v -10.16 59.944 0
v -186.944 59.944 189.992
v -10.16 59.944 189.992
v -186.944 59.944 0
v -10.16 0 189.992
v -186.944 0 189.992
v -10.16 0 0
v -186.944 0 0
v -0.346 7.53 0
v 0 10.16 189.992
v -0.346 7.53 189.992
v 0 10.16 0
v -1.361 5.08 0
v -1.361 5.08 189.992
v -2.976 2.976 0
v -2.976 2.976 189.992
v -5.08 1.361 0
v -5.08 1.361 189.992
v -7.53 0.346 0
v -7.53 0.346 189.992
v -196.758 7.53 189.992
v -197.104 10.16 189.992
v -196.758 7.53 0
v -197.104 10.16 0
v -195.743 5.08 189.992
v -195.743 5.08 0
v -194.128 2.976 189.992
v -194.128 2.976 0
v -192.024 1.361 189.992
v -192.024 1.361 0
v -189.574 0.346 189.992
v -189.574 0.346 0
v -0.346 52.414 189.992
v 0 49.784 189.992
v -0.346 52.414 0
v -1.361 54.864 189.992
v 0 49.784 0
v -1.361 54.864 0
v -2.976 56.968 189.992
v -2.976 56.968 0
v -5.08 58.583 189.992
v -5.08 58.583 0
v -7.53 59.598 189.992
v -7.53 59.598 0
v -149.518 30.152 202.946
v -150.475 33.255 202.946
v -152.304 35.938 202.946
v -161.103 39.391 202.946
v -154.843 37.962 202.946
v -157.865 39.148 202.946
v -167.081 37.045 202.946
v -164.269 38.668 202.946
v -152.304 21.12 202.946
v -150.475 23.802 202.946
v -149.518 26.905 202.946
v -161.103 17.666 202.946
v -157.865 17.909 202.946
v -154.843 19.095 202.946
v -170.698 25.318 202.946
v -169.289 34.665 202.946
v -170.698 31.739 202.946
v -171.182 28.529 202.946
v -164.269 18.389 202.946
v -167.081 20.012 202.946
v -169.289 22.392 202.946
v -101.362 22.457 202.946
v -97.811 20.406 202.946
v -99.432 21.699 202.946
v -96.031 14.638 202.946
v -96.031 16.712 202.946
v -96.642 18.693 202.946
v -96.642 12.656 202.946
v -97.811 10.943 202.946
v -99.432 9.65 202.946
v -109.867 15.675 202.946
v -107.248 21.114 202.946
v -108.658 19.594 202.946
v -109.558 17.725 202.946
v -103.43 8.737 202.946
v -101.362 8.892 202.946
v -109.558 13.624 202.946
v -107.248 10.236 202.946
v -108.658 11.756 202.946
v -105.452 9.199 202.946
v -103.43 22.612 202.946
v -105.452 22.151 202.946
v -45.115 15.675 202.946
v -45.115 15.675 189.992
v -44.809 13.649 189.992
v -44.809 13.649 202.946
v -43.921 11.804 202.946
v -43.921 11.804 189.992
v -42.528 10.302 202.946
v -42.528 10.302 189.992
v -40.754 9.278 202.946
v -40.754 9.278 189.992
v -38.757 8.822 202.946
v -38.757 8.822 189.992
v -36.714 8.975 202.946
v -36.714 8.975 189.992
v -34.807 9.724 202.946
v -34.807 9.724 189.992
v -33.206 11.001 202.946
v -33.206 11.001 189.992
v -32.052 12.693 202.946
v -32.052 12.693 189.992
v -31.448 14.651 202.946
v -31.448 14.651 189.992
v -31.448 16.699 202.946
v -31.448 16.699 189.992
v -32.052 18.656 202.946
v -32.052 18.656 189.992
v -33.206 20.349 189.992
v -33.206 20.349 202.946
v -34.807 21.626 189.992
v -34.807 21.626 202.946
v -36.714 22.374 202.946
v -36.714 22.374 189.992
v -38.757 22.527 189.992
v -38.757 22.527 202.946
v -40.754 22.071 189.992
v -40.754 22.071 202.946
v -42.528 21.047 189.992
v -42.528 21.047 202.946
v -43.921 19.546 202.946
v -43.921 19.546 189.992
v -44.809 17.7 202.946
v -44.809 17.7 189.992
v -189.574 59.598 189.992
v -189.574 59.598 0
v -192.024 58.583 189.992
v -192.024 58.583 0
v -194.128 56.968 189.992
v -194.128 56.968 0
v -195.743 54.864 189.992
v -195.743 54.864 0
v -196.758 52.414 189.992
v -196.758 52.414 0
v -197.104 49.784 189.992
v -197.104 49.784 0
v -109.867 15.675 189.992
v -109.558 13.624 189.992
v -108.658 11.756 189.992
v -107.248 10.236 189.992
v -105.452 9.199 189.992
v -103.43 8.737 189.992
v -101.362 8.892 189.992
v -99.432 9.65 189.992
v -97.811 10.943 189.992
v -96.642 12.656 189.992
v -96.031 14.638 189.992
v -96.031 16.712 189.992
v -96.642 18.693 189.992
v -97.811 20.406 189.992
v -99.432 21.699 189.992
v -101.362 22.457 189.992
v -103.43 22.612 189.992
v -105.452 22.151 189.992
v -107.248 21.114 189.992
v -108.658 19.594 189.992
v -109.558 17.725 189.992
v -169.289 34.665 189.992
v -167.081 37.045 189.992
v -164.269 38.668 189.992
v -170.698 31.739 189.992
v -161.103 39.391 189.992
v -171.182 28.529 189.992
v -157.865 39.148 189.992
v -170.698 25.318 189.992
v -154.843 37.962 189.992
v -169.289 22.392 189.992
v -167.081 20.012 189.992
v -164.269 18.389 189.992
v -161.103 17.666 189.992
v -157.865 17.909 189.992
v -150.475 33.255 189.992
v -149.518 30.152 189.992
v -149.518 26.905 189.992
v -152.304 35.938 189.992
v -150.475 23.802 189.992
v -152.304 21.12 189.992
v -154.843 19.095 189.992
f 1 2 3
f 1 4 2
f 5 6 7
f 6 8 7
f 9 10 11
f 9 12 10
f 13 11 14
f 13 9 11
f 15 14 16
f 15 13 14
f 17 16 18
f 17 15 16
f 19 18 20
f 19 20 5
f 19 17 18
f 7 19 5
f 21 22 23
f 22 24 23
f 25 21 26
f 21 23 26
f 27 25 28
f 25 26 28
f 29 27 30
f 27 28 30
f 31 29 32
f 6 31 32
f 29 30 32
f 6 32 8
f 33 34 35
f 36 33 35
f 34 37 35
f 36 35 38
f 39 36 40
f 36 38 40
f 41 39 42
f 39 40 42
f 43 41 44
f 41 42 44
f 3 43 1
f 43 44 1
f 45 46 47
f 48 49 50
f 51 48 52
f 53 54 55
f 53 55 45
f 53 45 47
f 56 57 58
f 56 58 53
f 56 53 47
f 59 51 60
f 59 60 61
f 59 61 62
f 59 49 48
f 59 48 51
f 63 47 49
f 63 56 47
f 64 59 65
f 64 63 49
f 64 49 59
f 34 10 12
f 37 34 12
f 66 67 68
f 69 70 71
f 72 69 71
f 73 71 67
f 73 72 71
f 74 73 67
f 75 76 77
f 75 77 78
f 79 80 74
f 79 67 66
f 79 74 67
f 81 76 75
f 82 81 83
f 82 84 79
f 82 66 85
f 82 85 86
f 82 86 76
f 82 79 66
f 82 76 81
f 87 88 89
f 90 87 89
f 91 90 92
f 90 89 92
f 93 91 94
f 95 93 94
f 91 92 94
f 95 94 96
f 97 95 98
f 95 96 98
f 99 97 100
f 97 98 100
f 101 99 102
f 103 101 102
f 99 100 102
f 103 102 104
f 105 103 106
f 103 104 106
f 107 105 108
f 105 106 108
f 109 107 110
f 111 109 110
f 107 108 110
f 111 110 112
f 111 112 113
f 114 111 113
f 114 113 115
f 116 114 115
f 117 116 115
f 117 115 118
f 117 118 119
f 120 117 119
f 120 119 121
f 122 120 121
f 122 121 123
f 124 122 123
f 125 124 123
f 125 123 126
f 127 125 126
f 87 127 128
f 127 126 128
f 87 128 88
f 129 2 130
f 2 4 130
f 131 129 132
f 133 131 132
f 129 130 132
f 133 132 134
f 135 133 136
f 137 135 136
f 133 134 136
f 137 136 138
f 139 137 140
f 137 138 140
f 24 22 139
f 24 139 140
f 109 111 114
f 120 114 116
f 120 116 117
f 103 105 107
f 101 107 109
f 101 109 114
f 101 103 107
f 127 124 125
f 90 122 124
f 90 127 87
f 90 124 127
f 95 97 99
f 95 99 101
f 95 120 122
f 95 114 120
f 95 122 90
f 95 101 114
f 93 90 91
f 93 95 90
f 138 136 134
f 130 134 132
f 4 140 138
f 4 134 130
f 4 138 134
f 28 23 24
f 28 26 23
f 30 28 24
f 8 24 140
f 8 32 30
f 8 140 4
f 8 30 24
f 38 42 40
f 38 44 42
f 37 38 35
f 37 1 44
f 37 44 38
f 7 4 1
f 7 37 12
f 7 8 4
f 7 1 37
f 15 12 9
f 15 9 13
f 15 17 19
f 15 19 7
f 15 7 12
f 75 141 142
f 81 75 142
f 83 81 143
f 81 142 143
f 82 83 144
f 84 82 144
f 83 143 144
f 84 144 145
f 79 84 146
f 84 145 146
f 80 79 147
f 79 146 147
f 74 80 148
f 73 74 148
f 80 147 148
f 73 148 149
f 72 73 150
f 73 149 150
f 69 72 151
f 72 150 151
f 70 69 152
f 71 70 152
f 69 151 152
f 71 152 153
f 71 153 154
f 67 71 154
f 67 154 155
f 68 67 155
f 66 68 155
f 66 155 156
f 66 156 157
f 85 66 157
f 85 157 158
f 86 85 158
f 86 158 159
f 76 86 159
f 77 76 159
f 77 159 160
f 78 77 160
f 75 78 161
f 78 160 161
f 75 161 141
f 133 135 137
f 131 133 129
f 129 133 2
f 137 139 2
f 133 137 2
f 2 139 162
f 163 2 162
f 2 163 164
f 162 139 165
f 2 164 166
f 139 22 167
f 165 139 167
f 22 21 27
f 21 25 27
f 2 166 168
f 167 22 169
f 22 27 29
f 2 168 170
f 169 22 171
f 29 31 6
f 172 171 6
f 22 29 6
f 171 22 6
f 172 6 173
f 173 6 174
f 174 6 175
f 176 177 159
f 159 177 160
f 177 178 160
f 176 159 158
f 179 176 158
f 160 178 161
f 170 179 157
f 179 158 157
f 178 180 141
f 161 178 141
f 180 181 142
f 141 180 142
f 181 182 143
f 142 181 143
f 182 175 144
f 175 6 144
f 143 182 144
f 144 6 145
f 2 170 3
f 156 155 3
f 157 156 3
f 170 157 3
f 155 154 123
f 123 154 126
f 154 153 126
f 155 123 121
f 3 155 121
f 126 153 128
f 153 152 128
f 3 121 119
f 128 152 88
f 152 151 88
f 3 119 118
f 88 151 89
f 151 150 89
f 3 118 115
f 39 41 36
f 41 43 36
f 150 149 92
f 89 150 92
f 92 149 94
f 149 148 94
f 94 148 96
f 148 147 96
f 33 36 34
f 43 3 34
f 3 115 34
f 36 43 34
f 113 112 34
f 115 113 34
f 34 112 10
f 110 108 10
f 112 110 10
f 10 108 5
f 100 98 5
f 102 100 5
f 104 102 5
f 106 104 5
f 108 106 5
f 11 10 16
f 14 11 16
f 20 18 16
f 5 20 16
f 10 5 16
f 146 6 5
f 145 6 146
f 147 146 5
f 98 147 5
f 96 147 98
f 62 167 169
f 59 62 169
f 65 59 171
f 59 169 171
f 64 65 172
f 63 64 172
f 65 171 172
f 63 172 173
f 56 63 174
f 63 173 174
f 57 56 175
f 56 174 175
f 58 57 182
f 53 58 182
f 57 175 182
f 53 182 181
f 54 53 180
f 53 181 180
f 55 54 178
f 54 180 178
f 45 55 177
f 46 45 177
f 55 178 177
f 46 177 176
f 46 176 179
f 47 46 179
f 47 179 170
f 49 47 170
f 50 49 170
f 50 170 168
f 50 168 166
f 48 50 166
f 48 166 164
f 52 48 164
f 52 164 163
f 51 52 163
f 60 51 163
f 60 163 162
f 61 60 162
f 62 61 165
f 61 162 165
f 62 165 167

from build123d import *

# Parameters (mm, degrees)
SKETCH1_W           = 197.104
SKETCH1_H           = 189.992
BOSS_EXTRUDE1_DEPTH = 59.944
FILLET1_R           = 10.16
FILLET2_R           = 10.16
FILLET3_R           = 10.16
FILLET4_R           = 10.16
SKETCH2_R           = 10.892824913
SKETCH2_R_2         = 6.956698316
SKETCH2_R_3         = 6.871617304
BOSS_EXTRUDE3_DEPTH = 12.954


with BuildPart() as part:
    # Sketch1 → Boss-Extrude1 (new body)
    with BuildSketch(Plane(origin=(0, 0, 0), x_dir=(1, 0, 0), z_dir=(0, 1, 0))):
        with Locations((-98.552, -94.996)):
            Rectangle(SKETCH1_W, SKETCH1_H)
    extrude(amount=BOSS_EXTRUDE1_DEPTH)

    # Fillet1
    fillet1_edges = [part.edges().sort_by_distance(p)[0] for p in [
        (0, 59.944, 94.996),
    ]]
    fillet(fillet1_edges, radius=FILLET1_R)

    # Fillet2
    fillet2_edges = [part.edges().sort_by_distance(p)[0] for p in [
        (0, 0, 94.996),
    ]]
    fillet(fillet2_edges, radius=FILLET2_R)

    # Fillet3
    fillet3_edges = [part.edges().sort_by_distance(p)[0] for p in [
        (-197.104, 59.944, 94.996),
    ]]
    fillet(fillet3_edges, radius=FILLET3_R)

    # Fillet4
    fillet4_edges = [part.edges().sort_by_distance(p)[0] for p in [
        (-197.104, 0, 94.996),
    ]]
    fillet(fillet4_edges, radius=FILLET4_R)

    # Sketch2 → Boss-Extrude3 (add)
    with BuildSketch(Plane.XY.offset(189.992)):
        with Locations(Location((-160.289066684, 28.528637542, 0), (0, 0, 180))):
            Circle(SKETCH2_R)
        with Locations(Location((-102.910266874, 15.674726269, 0), (0, 0, 180))):
            Circle(SKETCH2_R_2)
        with Locations(Location((-38.243166858, 15.674726269, 0), (0, 0, 180))):
            Circle(SKETCH2_R_3)
    extrude(amount=BOSS_EXTRUDE3_DEPTH)


solid = part.part
